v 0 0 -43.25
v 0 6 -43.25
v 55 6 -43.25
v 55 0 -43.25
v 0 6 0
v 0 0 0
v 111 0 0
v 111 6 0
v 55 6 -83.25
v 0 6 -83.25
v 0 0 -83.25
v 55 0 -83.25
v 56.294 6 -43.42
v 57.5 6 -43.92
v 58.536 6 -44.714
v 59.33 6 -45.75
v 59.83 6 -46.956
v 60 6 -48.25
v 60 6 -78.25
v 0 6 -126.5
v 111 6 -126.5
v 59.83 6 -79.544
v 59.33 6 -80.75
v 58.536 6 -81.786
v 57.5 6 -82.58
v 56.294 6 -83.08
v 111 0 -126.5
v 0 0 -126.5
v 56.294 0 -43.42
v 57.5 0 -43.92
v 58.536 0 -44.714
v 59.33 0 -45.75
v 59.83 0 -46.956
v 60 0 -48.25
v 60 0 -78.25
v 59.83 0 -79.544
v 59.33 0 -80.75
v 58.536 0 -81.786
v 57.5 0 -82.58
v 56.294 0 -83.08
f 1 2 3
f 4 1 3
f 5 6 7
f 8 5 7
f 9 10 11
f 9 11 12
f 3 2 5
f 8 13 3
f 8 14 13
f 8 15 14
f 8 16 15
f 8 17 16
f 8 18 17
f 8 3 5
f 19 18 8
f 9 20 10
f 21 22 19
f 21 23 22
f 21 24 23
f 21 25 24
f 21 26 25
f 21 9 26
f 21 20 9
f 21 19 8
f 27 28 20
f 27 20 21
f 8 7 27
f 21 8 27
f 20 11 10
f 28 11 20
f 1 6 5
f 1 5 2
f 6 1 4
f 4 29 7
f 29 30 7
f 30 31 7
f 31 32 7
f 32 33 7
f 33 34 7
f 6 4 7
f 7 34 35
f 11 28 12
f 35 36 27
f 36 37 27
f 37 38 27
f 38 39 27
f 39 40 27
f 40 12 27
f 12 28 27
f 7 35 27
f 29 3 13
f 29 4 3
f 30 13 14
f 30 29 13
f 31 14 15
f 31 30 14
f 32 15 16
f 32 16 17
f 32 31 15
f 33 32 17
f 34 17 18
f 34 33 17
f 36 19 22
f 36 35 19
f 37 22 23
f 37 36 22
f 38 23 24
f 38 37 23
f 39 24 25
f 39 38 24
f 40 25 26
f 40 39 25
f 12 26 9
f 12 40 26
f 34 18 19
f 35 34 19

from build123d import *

# Parameters (mm, degrees)
SKETCH1_W           = 111
SKETCH1_H           = 126.5
BOSS_EXTRUDE1_DEPTH = 6
SKETCH2_W           = 60
SKETCH2_H           = 40
CUT_EXTRUDE1_DEPTH  = 7
FILLET1_R           = 5


with BuildPart() as part:
    # Sketch1 → Boss-Extrude1 (new body)
    with BuildSketch(Plane(origin=(0, 0, 0), x_dir=(1, 0, 0), z_dir=(0, 1, 0))):
        with Locations((55.5, 63.25)):
            Rectangle(SKETCH1_W, SKETCH1_H)
    extrude(amount=BOSS_EXTRUDE1_DEPTH)

    # Sketch2 → Cut-Extrude1 (cut, through all)
    with BuildSketch(Plane(origin=(0, 6, 0), x_dir=(1, 0, 0), z_dir=(0, 1, 0))):
        with Locations((30, 63.25)):
            Rectangle(SKETCH2_W, SKETCH2_H)
    extrude(amount=-CUT_EXTRUDE1_DEPTH, mode=Mode.SUBTRACT)

    # Fillet1
    fillet1_edges = [part.edges().sort_by_distance(p)[0] for p in [
        (60, 3, -83.25),
        (60, 3, -43.25),
    ]]
    fillet(fillet1_edges, radius=FILLET1_R)


solid = part.part
